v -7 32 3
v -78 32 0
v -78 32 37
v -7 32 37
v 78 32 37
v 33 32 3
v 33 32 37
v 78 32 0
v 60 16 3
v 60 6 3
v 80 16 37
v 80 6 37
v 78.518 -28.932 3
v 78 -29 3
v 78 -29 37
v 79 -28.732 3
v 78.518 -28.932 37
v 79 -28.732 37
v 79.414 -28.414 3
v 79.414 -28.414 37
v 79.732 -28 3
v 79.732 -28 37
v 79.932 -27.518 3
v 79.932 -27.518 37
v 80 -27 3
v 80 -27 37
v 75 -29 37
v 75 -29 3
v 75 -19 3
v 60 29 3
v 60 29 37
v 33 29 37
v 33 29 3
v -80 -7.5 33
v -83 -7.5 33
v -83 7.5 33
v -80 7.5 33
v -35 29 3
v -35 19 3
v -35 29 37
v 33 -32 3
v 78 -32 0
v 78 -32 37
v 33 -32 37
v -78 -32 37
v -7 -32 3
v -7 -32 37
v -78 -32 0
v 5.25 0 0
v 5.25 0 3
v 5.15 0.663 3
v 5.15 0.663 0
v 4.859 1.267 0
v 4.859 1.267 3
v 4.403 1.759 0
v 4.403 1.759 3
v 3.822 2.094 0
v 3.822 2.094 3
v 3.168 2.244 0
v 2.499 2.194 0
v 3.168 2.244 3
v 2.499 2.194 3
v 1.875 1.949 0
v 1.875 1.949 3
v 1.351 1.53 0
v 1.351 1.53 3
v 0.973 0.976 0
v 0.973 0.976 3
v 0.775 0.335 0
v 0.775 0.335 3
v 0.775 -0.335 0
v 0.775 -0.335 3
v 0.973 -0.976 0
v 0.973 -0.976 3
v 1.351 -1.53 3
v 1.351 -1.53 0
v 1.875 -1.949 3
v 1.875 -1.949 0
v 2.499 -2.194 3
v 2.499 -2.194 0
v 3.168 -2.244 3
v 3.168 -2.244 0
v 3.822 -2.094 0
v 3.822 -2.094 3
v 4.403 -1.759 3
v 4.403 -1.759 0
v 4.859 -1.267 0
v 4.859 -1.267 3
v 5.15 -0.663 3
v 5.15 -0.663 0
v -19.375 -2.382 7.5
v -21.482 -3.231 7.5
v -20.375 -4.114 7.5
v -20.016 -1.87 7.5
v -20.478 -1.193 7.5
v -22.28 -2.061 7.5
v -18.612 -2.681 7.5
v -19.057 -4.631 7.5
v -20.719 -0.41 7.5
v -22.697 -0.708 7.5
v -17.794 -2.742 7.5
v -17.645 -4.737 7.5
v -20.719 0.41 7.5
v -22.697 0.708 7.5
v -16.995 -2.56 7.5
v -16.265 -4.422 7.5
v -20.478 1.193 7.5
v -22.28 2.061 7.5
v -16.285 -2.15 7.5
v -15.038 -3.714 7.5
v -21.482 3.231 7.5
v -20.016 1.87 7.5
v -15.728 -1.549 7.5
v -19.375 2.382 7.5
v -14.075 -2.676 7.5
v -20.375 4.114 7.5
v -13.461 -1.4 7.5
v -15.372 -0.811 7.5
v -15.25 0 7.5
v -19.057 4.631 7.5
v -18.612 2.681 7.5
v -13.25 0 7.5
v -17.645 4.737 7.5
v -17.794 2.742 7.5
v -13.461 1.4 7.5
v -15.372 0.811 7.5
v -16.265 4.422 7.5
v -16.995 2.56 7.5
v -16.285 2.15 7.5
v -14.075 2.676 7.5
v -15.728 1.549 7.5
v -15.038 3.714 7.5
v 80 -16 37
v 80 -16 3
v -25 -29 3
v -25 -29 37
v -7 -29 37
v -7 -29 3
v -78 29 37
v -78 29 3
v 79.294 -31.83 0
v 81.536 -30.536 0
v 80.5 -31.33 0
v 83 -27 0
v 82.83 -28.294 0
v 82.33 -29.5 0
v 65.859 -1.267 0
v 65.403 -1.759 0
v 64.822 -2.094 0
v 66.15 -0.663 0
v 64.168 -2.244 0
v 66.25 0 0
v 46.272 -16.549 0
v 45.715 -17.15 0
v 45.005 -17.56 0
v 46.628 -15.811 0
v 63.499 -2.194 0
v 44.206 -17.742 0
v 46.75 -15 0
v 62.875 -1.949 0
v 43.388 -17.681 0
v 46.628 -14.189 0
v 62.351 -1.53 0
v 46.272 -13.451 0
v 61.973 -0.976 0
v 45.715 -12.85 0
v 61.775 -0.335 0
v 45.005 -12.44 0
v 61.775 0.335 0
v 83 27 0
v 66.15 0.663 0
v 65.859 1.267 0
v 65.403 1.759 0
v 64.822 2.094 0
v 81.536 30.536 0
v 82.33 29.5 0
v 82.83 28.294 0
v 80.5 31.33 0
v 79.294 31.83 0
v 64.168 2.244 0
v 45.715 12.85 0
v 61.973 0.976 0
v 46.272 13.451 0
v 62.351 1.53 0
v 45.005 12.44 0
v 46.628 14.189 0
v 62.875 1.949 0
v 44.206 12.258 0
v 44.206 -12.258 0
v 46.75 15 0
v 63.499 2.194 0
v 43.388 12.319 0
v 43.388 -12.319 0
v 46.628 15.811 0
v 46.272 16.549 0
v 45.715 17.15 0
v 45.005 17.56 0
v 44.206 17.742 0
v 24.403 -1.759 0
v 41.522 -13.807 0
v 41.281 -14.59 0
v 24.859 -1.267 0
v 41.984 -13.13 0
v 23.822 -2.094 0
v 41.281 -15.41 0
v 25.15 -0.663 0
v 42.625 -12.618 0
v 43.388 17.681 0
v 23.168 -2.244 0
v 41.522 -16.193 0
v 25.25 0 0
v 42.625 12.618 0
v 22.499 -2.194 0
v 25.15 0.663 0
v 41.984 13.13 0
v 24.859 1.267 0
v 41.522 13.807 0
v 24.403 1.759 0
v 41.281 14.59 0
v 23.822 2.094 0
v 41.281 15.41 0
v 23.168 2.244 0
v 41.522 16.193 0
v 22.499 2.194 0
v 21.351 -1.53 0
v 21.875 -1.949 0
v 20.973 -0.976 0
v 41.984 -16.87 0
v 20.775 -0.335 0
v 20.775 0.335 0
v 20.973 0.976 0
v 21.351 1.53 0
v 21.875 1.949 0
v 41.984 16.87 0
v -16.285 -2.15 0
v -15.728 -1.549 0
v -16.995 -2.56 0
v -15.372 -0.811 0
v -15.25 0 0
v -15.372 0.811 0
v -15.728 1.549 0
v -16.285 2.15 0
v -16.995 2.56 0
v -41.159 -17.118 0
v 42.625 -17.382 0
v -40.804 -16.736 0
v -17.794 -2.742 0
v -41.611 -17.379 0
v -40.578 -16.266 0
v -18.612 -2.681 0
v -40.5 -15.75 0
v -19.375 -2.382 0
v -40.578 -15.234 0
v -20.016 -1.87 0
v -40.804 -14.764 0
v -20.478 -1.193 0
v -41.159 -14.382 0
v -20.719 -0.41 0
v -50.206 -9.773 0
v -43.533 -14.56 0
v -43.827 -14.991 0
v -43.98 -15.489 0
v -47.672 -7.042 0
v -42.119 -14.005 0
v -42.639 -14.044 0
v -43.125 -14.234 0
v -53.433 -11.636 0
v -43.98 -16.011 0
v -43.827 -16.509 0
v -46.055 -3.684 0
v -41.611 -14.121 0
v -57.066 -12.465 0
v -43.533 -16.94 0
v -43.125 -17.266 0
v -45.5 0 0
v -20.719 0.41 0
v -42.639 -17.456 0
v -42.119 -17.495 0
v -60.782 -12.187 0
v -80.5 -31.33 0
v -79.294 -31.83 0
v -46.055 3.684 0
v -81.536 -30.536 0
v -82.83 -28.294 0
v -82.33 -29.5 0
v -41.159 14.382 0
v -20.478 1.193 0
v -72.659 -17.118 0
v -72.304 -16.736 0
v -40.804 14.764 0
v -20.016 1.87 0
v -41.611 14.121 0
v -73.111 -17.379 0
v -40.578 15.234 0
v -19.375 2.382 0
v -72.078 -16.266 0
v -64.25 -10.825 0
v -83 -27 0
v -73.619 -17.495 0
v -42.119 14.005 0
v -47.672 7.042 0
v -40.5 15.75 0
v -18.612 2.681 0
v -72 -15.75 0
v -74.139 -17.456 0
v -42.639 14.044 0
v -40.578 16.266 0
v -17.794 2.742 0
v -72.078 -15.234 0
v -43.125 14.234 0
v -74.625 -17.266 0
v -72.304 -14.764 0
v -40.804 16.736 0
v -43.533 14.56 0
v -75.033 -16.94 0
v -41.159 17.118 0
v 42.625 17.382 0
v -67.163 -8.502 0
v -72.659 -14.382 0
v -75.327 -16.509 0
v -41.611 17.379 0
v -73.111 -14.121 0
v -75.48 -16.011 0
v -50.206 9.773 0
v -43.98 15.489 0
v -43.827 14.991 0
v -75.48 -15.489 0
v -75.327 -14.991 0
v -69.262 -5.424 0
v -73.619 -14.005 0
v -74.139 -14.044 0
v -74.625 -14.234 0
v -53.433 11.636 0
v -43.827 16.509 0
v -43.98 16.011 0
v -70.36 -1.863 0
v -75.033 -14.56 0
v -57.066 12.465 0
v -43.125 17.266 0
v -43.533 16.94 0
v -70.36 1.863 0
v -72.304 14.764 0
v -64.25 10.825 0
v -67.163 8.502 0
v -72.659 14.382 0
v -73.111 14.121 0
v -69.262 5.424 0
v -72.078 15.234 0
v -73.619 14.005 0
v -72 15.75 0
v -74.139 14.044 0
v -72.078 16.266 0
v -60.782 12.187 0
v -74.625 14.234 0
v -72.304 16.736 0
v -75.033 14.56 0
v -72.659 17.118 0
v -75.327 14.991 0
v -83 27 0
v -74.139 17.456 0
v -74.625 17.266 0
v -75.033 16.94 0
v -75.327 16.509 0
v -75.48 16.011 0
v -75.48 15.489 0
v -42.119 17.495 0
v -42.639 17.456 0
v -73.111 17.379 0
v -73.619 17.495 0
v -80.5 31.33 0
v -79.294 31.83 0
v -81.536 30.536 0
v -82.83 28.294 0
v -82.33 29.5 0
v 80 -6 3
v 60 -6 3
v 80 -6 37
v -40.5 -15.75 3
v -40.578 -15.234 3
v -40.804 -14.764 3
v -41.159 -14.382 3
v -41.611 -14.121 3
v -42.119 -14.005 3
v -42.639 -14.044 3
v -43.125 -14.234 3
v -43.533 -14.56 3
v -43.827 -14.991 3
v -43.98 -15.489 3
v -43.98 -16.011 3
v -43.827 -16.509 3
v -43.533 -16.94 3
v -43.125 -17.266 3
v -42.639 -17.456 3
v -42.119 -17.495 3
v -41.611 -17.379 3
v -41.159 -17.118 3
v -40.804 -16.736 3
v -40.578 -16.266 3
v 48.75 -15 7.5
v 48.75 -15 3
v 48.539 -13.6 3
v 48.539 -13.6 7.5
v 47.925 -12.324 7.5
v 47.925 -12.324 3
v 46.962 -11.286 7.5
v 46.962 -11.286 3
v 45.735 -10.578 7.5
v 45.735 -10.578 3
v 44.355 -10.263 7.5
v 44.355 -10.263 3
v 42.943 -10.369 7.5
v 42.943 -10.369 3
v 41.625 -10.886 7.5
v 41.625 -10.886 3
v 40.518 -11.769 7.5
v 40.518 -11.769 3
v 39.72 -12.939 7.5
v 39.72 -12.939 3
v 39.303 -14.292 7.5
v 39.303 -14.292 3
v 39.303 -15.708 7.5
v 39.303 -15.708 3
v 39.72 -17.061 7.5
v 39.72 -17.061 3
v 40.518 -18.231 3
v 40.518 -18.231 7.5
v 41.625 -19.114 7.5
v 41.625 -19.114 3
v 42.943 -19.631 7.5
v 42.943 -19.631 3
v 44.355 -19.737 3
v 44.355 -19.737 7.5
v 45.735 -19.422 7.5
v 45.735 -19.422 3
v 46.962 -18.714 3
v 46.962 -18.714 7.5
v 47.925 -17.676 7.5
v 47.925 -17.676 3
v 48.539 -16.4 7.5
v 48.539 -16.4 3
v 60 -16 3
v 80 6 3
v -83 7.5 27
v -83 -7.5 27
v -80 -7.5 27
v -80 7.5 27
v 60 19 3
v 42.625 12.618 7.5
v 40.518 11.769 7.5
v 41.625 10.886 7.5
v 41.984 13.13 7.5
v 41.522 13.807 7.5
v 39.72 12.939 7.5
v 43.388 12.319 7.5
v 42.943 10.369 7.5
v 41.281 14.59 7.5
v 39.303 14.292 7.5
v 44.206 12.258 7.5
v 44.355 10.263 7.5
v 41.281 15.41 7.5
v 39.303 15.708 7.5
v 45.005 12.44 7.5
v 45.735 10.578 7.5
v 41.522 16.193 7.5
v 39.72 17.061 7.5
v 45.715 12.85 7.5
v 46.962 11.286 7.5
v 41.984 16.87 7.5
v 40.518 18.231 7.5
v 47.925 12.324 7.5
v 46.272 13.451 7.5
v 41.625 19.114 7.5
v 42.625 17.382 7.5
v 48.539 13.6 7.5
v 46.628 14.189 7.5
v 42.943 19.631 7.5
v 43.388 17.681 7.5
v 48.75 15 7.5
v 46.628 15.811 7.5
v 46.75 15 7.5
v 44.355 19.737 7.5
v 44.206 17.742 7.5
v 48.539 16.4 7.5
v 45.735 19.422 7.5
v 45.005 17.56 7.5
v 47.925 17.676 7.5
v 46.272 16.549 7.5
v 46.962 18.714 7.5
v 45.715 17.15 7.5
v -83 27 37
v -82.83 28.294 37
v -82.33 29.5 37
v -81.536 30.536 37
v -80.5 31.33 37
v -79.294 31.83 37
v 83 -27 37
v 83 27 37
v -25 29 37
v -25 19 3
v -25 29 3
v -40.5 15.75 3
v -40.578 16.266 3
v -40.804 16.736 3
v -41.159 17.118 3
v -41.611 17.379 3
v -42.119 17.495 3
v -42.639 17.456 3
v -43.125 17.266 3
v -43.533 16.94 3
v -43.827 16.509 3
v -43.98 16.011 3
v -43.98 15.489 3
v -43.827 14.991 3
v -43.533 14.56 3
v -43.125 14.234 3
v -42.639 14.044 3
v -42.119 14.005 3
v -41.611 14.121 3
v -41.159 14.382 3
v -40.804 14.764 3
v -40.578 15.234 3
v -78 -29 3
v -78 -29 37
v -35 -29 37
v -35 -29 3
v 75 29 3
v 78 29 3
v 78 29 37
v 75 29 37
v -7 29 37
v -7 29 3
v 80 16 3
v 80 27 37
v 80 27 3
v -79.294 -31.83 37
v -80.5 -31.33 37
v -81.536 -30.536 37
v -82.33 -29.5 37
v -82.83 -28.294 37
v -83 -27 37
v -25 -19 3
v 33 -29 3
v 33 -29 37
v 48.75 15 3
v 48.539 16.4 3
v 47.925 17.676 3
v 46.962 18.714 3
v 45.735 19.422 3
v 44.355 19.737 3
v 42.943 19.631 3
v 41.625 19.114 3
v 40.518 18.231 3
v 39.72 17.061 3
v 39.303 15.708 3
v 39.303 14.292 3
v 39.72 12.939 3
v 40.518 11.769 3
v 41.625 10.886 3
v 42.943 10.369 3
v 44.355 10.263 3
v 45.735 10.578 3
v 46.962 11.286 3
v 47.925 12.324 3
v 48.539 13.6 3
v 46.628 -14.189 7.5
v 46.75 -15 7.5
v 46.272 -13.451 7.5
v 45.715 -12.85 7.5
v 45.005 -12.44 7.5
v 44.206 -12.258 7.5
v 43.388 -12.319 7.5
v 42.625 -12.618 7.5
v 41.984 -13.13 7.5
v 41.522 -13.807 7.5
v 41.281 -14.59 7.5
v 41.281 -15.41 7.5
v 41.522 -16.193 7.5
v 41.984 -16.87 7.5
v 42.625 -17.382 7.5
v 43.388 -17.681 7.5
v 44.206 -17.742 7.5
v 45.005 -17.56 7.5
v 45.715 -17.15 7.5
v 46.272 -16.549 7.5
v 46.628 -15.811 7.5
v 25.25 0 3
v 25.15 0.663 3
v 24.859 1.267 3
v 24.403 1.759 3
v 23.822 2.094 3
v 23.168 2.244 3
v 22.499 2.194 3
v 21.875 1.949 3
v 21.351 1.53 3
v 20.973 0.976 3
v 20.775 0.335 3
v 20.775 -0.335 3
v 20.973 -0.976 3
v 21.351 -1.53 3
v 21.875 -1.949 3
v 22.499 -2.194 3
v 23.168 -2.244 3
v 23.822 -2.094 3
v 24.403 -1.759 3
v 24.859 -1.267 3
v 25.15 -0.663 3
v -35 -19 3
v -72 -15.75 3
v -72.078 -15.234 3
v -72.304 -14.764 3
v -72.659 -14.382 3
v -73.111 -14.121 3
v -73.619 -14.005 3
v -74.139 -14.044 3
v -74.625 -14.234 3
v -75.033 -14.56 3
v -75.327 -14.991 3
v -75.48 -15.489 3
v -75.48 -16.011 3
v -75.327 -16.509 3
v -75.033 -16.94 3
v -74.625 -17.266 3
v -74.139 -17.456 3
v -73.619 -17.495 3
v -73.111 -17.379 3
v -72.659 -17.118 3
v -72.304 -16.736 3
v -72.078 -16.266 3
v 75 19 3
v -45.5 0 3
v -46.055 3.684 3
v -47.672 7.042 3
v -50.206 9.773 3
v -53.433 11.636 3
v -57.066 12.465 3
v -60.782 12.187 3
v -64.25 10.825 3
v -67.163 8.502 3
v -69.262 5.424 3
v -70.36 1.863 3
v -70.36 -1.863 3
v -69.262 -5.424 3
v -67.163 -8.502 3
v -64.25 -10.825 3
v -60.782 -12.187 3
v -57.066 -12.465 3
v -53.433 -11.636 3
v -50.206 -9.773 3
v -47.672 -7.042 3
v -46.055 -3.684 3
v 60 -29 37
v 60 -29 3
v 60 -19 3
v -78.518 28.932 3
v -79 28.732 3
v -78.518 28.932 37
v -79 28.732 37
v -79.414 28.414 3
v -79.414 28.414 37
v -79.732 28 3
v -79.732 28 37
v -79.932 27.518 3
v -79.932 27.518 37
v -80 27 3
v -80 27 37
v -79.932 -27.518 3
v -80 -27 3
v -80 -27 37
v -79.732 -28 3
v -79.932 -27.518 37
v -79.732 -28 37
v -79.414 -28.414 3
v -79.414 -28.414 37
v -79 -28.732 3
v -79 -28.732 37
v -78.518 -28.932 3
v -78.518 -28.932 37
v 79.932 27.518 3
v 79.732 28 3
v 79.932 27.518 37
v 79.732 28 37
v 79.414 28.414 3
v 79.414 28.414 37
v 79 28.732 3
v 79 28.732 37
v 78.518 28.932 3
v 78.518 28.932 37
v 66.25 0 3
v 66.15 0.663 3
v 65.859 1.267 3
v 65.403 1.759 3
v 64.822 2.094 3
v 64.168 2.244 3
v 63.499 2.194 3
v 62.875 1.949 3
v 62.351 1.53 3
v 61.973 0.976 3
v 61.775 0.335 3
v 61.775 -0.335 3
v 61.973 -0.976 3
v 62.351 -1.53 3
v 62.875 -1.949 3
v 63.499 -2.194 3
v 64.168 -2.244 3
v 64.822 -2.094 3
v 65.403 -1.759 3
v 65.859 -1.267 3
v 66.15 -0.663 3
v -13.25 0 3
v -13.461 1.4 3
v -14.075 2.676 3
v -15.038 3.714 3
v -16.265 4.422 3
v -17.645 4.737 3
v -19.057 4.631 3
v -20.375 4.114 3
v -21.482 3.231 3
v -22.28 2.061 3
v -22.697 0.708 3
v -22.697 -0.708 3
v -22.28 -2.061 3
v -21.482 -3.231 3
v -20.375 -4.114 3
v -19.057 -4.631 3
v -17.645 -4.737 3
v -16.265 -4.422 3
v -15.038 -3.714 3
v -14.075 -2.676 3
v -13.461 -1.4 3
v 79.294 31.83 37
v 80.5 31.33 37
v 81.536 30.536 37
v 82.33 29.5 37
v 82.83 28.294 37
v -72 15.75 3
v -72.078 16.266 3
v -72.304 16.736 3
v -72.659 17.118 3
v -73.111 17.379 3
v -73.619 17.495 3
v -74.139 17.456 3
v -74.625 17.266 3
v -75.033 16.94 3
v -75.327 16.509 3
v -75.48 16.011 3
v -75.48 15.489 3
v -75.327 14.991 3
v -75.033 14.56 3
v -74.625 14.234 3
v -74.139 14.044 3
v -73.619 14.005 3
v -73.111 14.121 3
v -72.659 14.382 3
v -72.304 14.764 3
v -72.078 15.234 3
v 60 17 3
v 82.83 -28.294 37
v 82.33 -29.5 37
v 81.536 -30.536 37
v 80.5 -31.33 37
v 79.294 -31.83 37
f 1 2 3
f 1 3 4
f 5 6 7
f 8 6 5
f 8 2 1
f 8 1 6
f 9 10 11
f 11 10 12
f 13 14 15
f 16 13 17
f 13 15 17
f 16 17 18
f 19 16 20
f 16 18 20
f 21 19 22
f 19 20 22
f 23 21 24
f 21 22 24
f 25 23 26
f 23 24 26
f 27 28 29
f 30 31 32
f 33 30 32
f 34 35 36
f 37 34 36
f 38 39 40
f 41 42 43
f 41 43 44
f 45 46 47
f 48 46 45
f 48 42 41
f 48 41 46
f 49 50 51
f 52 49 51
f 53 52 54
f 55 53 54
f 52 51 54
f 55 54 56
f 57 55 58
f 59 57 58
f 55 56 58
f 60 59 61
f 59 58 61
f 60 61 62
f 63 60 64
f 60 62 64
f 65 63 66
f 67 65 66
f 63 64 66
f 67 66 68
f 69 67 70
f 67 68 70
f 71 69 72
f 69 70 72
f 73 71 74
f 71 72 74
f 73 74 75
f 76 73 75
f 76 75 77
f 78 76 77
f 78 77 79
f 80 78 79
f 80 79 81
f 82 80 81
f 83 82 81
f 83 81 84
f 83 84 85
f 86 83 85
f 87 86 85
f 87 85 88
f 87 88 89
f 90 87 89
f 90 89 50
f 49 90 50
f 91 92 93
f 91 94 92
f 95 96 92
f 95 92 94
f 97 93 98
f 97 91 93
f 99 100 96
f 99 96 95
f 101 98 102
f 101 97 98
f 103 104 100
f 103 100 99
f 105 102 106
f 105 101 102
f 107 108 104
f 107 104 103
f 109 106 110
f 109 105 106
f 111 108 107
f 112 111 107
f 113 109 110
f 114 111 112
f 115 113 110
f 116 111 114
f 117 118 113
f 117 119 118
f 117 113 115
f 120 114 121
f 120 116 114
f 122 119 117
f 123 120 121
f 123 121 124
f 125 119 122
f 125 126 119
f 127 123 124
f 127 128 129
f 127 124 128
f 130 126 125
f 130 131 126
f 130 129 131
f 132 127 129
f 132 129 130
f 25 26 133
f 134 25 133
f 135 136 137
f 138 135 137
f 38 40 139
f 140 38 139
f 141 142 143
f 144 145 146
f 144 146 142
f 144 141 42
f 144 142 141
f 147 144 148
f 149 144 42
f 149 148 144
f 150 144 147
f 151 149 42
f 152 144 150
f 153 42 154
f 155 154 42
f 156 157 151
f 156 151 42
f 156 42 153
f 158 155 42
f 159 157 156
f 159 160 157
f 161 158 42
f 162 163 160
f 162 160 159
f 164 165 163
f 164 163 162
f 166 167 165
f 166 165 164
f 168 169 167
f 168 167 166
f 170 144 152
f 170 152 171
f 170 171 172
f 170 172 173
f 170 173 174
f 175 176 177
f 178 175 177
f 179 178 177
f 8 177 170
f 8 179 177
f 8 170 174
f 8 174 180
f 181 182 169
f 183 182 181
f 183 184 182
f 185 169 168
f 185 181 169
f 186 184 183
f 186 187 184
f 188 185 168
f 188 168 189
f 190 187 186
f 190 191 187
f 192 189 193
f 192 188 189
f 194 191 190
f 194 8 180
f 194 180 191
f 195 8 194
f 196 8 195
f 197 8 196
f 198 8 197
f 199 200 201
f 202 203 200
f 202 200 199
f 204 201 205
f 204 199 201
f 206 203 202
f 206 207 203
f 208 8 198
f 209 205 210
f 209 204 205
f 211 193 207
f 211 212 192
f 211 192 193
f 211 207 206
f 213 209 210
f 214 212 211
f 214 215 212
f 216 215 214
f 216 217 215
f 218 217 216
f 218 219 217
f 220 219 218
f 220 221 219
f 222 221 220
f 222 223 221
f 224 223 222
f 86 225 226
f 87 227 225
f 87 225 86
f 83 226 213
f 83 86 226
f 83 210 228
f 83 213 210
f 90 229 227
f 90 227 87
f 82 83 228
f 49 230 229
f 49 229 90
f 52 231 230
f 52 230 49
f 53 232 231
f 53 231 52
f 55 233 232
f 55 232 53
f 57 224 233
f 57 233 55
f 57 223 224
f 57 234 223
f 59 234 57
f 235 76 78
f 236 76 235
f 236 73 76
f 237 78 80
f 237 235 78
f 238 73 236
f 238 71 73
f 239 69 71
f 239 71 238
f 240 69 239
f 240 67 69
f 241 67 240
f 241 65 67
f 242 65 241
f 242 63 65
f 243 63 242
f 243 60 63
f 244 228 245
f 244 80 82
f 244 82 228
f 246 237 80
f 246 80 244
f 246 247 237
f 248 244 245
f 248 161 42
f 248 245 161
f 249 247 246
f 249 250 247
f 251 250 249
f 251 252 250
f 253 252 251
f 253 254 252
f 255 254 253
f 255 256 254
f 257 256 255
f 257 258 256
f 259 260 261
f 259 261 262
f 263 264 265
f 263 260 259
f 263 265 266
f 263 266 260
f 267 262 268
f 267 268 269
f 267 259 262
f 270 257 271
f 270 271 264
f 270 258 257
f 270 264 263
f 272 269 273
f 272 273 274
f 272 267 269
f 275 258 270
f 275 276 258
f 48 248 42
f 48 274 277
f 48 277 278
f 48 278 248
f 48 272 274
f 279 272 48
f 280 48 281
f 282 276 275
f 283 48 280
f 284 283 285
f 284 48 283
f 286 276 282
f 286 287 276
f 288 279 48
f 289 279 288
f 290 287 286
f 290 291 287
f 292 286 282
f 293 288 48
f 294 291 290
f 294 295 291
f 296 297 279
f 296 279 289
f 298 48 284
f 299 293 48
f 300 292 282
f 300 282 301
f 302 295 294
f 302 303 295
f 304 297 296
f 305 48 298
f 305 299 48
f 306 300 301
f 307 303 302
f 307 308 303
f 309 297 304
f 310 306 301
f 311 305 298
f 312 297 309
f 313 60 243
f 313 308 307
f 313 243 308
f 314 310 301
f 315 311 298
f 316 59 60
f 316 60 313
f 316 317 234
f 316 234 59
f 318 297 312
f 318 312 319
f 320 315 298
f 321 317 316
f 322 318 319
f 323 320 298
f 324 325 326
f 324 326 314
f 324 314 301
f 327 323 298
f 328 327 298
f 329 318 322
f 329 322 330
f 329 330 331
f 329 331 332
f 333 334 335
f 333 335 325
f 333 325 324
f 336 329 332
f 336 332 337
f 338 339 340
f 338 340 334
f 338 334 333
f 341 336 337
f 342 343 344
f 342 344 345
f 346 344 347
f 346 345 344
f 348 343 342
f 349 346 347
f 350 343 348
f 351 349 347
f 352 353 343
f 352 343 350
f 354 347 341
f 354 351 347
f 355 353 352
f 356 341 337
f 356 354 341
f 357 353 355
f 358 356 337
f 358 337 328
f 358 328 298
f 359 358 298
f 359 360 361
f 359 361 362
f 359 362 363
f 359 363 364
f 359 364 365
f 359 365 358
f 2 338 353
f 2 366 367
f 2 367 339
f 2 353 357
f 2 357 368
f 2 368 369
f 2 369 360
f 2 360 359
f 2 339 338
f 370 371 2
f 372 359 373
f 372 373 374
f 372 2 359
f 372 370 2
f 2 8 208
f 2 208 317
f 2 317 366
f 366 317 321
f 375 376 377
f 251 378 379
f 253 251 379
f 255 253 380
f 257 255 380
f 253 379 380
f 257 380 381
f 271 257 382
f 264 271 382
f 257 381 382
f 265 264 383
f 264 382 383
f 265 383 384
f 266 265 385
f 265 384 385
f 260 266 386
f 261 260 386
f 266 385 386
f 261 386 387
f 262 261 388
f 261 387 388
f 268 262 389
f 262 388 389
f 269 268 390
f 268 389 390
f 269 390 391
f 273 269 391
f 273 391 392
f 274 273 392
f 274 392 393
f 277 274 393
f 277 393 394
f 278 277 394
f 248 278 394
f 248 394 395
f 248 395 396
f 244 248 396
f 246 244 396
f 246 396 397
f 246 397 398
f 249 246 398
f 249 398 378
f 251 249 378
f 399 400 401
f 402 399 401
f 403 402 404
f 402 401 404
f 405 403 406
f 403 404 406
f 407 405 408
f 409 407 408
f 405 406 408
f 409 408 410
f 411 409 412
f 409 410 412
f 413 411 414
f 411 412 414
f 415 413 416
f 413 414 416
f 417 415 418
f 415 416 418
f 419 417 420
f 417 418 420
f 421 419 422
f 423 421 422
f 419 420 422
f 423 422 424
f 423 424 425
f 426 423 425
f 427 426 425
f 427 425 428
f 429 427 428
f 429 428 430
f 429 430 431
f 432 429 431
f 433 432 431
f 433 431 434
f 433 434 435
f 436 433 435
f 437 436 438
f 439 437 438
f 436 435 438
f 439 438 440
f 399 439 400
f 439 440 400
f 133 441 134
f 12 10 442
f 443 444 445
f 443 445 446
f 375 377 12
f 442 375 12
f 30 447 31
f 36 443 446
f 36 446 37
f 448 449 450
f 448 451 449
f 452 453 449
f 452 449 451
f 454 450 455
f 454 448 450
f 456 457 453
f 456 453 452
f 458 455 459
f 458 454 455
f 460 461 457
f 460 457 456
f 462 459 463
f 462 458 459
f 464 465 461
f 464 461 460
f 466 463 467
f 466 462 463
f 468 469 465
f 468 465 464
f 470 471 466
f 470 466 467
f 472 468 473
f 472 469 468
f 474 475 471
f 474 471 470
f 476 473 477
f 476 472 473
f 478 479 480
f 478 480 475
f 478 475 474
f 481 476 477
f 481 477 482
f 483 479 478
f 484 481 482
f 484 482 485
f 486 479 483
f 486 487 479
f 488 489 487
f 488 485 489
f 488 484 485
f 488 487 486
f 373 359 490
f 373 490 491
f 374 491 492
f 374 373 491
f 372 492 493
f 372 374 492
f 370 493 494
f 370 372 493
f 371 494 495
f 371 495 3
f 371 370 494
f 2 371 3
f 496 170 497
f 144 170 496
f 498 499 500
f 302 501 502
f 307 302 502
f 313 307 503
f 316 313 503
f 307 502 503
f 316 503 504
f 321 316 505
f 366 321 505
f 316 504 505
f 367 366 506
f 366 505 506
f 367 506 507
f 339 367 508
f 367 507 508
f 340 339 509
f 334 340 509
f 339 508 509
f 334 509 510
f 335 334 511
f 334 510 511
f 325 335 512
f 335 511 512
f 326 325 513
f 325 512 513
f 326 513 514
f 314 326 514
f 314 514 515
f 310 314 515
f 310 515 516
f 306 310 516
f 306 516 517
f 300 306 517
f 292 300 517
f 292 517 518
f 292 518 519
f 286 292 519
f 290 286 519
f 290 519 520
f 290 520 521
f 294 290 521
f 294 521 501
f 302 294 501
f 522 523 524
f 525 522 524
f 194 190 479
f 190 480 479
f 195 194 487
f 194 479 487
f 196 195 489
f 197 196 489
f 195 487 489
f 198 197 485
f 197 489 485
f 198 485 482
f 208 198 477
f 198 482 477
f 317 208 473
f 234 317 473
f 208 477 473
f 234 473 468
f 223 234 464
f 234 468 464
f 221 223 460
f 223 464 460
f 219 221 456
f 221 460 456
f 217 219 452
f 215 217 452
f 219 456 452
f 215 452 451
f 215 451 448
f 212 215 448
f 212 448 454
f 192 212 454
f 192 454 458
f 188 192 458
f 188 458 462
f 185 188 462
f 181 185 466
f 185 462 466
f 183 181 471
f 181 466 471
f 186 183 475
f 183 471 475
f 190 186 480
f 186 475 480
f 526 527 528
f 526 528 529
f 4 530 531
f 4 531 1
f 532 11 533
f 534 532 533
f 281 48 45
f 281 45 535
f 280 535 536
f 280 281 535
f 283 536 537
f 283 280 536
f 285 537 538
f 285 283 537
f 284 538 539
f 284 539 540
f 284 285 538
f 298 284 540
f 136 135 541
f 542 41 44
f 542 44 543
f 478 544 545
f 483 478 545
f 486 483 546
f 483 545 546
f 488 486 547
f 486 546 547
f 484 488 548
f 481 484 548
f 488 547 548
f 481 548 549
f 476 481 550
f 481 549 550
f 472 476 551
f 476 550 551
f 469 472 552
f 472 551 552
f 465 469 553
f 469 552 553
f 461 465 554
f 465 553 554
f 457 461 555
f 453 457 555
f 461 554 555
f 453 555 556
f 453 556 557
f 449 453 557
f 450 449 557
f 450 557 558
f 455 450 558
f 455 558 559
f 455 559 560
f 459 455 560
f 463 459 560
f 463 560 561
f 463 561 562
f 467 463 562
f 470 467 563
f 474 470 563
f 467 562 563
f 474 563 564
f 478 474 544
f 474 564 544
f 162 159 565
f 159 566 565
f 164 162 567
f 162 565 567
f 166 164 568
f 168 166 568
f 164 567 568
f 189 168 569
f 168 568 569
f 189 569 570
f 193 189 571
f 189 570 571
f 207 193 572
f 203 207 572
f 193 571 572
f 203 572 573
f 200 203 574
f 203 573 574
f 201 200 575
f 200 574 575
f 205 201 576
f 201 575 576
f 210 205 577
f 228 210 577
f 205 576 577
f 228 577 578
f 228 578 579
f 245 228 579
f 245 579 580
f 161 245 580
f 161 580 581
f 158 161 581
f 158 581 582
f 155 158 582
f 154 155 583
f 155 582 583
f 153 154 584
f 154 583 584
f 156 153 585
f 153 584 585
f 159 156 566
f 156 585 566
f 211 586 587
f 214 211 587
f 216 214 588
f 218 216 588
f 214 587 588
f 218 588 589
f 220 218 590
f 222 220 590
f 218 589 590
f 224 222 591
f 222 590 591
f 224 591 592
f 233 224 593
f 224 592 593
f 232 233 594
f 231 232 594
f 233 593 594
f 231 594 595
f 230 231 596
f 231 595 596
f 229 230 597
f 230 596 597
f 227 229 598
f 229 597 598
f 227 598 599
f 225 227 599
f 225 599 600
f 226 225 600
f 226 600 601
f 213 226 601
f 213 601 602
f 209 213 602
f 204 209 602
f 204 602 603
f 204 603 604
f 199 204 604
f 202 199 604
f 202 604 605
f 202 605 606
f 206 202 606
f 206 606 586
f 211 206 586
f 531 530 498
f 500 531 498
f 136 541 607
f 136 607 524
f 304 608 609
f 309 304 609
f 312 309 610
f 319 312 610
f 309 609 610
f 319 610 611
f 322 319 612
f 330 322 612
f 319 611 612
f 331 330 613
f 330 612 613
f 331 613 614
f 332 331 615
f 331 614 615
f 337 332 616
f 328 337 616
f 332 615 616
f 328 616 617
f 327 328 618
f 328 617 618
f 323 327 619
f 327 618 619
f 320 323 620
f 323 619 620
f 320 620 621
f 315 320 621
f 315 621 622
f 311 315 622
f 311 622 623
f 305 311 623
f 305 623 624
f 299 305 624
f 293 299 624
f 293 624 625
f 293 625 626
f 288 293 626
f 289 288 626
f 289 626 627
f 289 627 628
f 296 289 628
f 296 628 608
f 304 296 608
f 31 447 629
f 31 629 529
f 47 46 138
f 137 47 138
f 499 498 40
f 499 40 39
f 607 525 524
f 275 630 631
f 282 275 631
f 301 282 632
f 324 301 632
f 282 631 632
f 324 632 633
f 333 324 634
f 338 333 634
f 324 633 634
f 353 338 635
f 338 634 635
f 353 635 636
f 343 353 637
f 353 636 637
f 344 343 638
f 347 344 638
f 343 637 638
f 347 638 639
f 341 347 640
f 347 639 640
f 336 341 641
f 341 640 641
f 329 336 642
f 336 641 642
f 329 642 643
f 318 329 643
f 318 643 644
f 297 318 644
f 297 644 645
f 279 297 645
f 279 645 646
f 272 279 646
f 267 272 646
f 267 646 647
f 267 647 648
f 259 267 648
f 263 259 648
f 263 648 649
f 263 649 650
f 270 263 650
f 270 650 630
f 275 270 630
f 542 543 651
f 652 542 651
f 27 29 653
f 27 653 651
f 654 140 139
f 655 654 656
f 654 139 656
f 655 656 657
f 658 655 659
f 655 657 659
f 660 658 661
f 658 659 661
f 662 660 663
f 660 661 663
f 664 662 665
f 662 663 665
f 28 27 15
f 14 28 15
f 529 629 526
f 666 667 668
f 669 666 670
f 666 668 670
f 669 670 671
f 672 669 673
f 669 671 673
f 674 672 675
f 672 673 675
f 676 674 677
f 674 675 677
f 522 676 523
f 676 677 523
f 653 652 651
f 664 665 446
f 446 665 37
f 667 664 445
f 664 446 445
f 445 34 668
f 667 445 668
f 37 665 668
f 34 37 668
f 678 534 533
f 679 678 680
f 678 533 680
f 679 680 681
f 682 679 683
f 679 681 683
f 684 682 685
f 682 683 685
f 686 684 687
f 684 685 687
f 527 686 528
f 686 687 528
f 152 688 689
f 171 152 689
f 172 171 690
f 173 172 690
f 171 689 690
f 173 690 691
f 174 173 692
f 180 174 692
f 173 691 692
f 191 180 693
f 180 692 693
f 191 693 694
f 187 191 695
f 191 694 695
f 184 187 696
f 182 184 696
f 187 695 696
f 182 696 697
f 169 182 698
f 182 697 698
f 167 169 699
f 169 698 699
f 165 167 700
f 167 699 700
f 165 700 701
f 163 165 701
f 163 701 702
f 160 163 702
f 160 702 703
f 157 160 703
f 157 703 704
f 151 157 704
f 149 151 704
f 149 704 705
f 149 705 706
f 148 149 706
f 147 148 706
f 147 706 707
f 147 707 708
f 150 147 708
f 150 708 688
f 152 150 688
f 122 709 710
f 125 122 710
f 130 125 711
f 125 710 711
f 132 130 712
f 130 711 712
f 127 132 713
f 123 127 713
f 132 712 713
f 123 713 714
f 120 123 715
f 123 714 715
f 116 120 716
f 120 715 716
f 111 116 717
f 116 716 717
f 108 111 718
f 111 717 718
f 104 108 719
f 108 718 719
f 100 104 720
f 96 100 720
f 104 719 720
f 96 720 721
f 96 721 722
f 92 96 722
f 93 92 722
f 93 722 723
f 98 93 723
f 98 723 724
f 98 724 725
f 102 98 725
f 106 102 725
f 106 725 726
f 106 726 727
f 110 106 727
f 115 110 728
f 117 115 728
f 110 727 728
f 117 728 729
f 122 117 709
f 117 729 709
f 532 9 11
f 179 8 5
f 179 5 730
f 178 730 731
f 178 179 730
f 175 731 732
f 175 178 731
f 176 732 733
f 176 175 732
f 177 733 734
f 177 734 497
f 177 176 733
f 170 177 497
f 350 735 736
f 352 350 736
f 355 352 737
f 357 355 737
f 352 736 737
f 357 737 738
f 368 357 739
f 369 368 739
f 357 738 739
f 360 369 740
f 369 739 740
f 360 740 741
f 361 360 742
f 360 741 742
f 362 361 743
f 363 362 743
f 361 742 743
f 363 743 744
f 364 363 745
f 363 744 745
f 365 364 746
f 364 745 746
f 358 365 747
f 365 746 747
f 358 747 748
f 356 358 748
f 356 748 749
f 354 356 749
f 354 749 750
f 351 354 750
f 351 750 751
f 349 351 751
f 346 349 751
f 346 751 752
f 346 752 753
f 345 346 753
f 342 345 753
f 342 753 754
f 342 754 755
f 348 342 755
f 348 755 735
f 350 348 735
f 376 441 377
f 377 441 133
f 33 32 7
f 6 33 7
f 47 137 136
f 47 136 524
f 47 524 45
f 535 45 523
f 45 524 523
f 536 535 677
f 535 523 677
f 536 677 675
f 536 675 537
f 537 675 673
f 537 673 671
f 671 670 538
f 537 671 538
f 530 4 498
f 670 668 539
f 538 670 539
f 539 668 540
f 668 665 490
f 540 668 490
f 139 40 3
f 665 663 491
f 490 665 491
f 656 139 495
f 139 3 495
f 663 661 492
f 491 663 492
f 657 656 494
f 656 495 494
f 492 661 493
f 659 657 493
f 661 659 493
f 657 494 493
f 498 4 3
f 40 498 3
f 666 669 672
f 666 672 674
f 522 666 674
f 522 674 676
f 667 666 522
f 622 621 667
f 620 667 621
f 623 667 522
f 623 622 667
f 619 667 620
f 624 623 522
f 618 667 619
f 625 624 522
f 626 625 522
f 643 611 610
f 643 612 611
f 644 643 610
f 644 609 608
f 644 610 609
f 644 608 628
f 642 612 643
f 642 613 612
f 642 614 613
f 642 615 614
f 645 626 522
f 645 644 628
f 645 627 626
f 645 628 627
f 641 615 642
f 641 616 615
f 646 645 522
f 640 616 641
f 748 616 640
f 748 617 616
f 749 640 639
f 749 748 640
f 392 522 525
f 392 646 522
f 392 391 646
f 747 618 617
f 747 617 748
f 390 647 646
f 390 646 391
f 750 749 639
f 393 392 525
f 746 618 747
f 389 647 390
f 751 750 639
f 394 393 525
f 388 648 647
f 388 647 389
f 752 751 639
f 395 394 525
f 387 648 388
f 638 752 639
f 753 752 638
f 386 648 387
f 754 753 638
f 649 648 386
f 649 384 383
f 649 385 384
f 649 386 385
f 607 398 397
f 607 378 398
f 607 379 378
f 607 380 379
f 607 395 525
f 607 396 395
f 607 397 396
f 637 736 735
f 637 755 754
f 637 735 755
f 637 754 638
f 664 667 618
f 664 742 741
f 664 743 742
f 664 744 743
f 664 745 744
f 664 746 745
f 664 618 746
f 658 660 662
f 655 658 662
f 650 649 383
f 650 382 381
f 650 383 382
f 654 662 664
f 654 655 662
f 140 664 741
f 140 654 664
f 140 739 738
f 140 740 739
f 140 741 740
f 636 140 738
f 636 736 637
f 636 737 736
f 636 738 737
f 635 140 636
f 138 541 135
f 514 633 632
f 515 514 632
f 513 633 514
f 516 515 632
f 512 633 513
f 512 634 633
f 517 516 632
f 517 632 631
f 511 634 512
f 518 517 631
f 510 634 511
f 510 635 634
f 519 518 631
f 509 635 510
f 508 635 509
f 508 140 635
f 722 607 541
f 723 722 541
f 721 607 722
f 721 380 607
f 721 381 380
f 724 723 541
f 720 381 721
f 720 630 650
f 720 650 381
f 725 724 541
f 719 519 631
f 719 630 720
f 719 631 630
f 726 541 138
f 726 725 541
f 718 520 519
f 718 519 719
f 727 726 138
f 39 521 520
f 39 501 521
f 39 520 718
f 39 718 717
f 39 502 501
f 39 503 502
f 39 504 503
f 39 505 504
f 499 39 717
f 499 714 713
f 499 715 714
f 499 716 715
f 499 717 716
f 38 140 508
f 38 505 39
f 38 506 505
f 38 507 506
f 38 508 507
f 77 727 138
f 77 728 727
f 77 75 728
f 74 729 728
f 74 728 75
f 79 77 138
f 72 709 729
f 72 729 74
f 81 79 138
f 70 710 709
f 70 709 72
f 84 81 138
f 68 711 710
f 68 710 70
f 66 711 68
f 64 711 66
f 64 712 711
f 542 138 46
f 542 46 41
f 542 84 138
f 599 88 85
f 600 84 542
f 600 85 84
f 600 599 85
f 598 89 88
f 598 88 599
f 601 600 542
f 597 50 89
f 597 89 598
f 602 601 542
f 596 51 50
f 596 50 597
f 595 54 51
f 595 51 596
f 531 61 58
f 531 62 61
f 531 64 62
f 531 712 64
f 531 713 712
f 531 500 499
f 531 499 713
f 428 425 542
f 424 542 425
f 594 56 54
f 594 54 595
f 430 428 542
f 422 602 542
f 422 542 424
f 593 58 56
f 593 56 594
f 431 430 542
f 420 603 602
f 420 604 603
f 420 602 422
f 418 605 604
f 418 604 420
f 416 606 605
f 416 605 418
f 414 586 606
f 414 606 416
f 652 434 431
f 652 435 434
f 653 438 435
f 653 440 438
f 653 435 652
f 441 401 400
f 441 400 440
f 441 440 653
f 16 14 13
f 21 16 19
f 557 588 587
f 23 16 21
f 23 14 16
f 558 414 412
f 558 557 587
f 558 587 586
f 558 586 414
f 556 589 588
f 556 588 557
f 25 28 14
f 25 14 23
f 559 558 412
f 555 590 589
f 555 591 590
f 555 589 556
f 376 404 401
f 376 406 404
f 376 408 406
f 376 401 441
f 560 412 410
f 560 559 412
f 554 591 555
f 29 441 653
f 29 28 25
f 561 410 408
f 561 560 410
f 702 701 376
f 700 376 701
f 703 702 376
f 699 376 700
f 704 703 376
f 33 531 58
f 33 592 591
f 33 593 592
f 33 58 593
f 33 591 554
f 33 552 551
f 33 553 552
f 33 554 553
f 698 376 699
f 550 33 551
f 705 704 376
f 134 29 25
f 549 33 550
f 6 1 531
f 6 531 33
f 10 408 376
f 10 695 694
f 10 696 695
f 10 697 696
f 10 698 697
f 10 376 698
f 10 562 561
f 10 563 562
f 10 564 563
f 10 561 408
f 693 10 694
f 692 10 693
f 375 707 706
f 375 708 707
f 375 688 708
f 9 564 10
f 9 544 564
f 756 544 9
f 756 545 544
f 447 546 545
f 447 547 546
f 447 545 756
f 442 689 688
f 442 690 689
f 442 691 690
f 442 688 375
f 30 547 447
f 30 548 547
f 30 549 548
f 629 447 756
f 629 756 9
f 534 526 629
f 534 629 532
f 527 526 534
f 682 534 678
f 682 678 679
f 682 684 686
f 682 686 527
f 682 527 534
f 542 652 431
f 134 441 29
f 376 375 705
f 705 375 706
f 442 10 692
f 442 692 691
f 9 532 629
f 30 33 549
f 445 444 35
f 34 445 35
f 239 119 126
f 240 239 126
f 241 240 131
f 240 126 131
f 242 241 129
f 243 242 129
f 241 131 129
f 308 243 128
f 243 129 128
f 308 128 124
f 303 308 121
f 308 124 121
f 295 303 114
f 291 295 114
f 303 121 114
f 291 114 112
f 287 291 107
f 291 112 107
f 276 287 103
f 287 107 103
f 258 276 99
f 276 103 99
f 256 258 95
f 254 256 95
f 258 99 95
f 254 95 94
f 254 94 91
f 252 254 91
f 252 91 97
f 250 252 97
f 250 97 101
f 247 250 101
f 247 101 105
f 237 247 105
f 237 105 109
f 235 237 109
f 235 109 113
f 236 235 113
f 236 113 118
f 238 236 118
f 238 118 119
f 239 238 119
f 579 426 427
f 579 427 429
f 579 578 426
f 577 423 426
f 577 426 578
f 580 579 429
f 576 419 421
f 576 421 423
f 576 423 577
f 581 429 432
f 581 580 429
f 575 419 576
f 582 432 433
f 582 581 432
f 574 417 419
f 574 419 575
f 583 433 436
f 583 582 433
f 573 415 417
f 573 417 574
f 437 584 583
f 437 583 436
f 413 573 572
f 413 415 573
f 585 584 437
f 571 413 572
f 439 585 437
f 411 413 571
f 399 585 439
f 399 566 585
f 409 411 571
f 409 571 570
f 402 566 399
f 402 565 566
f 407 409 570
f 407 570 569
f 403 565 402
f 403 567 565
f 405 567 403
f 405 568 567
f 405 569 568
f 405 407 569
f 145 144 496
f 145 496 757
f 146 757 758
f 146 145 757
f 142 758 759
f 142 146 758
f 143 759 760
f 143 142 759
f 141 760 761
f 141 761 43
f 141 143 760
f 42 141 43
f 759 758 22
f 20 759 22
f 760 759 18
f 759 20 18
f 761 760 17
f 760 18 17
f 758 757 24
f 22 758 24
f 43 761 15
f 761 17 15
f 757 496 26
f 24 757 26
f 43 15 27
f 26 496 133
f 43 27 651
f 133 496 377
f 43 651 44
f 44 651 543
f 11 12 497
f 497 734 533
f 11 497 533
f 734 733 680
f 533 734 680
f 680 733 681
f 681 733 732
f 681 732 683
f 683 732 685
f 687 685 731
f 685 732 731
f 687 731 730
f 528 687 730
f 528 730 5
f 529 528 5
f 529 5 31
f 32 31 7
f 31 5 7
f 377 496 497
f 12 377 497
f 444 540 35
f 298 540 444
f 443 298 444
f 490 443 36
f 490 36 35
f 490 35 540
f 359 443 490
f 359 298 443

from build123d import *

# Parameters (mm, degrees)
BOSS_EXTRUDE1_DEPTH = 37
SKETCH2_R           = 1.75
SKETCH2_R_2         = 12.5
SKETCH2_R_3         = 2.75
SKETCH2_R_4         = 2.25
CUT_EXTRUDE1_DEPTH  = 38
SKETCH5_R           = 2.25
CUT_EXTRUDE2_DEPTH  = 38
CUT_EXTRUDE3_DEPTH  = 34
SKETCH7_R           = 4.75
BOSS_EXTRUDE2_DEPTH = 4.5
SKETCH10_W          = 40
SKETCH10_H          = 64
CUT_EXTRUDE4_DEPTH  = 34
SKETCH11_R          = 2.75
CUT_EXTRUDE5_DEPTH  = 8.5
SKETCH12_W          = 15
SKETCH12_H          = 10
SKETCH12_W_2        = 20
SKETCH12_W_3        = 10
BOSS_EXTRUDE3_DEPTH = 34
CUT_EXTRUDE6_DEPTH  = 33
CUT_EXTRUDE8_DEPTH  = 15
CUT_EXTRUDE9_DEPTH  = 15
CUT_EXTRUDE10_DEPTH = 10
CUT_EXTRUDE11_DEPTH = 10
SKETCH20_W          = 6
SKETCH20_H          = 15
CUT_EXTRUDE12_DEPTH = 3


with BuildPart() as part:
    # Sketch1 → Boss-Extrude1 (new body)
    with BuildSketch(Plane.XY):
        with BuildLine():
            Line((-78, 32), (78, 32))
            ThreePointArc((78, 32), (81.535533906, 30.535533906), (83, 27))
            Line((83, 27), (83, -27))
            ThreePointArc((83, -27), (81.535533906, -30.535533906), (78, -32))
            Line((78, -32), (-78, -32))
            ThreePointArc((-78, -32), (-81.535533906, -30.535533906), (-83, -27))
            Line((-83, -27), (-83, 27))
            ThreePointArc((-83, 27), (-81.535533906, 30.535533906), (-78, 32))
        make_face()
    extrude(amount=BOSS_EXTRUDE1_DEPTH)

    # Sketch2 → Cut-Extrude1 (cut, through all)
    with BuildSketch(Plane.XY.offset(37)):
        with Locations((-73.75, 15.75)):
            Circle(SKETCH2_R)
        with Locations((-42.25, 15.75)):
            Circle(SKETCH2_R)
        with Locations((-73.75, -15.75)):
            Circle(SKETCH2_R)
        with Locations((-42.25, -15.75)):
            Circle(SKETCH2_R)
        with Locations((-58, 0)):
            Circle(SKETCH2_R_2)
        with Locations((44, 15)):
            Circle(SKETCH2_R_3)
        with Locations((44, -15)):
            Circle(SKETCH2_R_3)
        with Locations((-18, 0)):
            Circle(SKETCH2_R_3)
        with Locations((64, 0)):
            Circle(SKETCH2_R_4)
    extrude(amount=-CUT_EXTRUDE1_DEPTH, mode=Mode.SUBTRACT)

    # Sketch5 → Cut-Extrude2 (cut, through all)
    with BuildSketch(Plane.XY.offset(37)):
        with Locations((3, 0)):
            Circle(SKETCH5_R)
        with Locations((23, 0)):
            Circle(SKETCH5_R)
    extrude(amount=-CUT_EXTRUDE2_DEPTH, mode=Mode.SUBTRACT)

    # Sketch6 → Cut-Extrude3 (cut)
    with BuildSketch(Plane.XY.offset(37)):
        with BuildLine():
            Line((-78, -29), (78, -29))
            ThreePointArc((78, -29), (79.414213562, -28.414213562), (80, -27))
            Line((80, -27), (80, 27))
            ThreePointArc((80, 27), (79.414213562, 28.414213562), (78, 29))
            Line((78, 29), (-78, 29))
            ThreePointArc((-78, 29), (-79.414213562, 28.414213562), (-80, 27))
            Line((-80, 27), (-80, -27))
            ThreePointArc((-80, -27), (-79.414213562, -28.414213562), (-78, -29))
        make_face()
    extrude(amount=-CUT_EXTRUDE3_DEPTH, mode=Mode.SUBTRACT)

    # Sketch7 → Boss-Extrude2 (add)
    with BuildSketch(Plane.XY.offset(3)):
        with Locations((-18, 0)):
            Circle(SKETCH7_R)
        with Locations((44, -15)):
            Circle(SKETCH7_R)
        with Locations((44, 15)):
            Circle(SKETCH7_R)
    extrude(amount=BOSS_EXTRUDE2_DEPTH)

    # Sketch10 → Cut-Extrude4 (cut)
    with BuildSketch(Plane.XY.offset(37)):
        with Locations((13, 0)):
            Rectangle(SKETCH10_W, SKETCH10_H)
    extrude(amount=-CUT_EXTRUDE4_DEPTH, mode=Mode.SUBTRACT)

    # Sketch11 → Cut-Extrude5 (cut, through all)
    with BuildSketch(Plane.XY.offset(7.5)):
        with Locations((44, -15)):
            Circle(SKETCH11_R)
        with Locations((-18, 0)):
            Circle(SKETCH11_R)
        with Locations((44, 15)):
            Circle(SKETCH11_R)
    extrude(amount=-CUT_EXTRUDE5_DEPTH, mode=Mode.SUBTRACT)

    # Sketch12 → Boss-Extrude3 (add, through all)
    with BuildSketch(Plane.XY.offset(3)):
        with Locations((67.5, -24)):
            Rectangle(SKETCH12_W, SKETCH12_H)
        with Locations((67.5, 24)):
            Rectangle(SKETCH12_W, SKETCH12_H)
        with Locations((70, -11)):
            Rectangle(SKETCH12_W_2, SKETCH12_H)
        with Locations((70, 11)):
            Rectangle(SKETCH12_W_2, SKETCH12_H)
        with Locations((-30, -24)):
            Rectangle(SKETCH12_W_3, SKETCH12_H)
        with Locations((-30, 24)):
            Rectangle(SKETCH12_W_3, SKETCH12_H)
    extrude(amount=BOSS_EXTRUDE3_DEPTH)

    # Sketch14 → Cut-Extrude6 (cut)
    with BuildSketch(Plane.XZ.offset(16)):
        Polygon((80, 37), (60, 37), (60, 3), align=None)
    extrude(amount=-CUT_EXTRUDE6_DEPTH, mode=Mode.SUBTRACT)

    # Sketch16 → Cut-Extrude8 (cut)
    with BuildSketch(Plane(origin=(75, 0, 0), x_dir=(0, 0, -1), z_dir=(1, 0, 0))):
        Polygon((-37, -19), (-3, -19), (-37, -29), align=None)
    extrude(amount=-CUT_EXTRUDE8_DEPTH, mode=Mode.SUBTRACT)

    # Sketch17 → Cut-Extrude9 (cut)
    with BuildSketch(Plane.ZY.offset(-60)):
        Polygon((37, 19), (3, 19), (37, 29), align=None)
    extrude(amount=-CUT_EXTRUDE9_DEPTH, mode=Mode.SUBTRACT)

    # Sketch18 → Cut-Extrude10 (cut)
    with BuildSketch(Plane(origin=(-25, 0, 0), x_dir=(0, 0, -1), z_dir=(1, 0, 0))):
        Polygon((-37, -29), (-37, -19), (-3, -19), align=None)
    extrude(amount=-CUT_EXTRUDE10_DEPTH, mode=Mode.SUBTRACT)

    # Sketch19 → Cut-Extrude11 (cut)
    with BuildSketch(Plane(origin=(-25, 0, 0), x_dir=(0, 0, -1), z_dir=(1, 0, 0))):
        Polygon((-37, 29), (-3, 19), (-37, 19), align=None)
    extrude(amount=-CUT_EXTRUDE11_DEPTH, mode=Mode.SUBTRACT)

    # Sketch20 → Cut-Extrude12 (cut)
    with BuildSketch(Plane.ZY.offset(83)):
        with Locations((30, 0)):
            Rectangle(SKETCH20_W, SKETCH20_H)
    extrude(amount=-CUT_EXTRUDE12_DEPTH, mode=Mode.SUBTRACT)


solid = part.part
